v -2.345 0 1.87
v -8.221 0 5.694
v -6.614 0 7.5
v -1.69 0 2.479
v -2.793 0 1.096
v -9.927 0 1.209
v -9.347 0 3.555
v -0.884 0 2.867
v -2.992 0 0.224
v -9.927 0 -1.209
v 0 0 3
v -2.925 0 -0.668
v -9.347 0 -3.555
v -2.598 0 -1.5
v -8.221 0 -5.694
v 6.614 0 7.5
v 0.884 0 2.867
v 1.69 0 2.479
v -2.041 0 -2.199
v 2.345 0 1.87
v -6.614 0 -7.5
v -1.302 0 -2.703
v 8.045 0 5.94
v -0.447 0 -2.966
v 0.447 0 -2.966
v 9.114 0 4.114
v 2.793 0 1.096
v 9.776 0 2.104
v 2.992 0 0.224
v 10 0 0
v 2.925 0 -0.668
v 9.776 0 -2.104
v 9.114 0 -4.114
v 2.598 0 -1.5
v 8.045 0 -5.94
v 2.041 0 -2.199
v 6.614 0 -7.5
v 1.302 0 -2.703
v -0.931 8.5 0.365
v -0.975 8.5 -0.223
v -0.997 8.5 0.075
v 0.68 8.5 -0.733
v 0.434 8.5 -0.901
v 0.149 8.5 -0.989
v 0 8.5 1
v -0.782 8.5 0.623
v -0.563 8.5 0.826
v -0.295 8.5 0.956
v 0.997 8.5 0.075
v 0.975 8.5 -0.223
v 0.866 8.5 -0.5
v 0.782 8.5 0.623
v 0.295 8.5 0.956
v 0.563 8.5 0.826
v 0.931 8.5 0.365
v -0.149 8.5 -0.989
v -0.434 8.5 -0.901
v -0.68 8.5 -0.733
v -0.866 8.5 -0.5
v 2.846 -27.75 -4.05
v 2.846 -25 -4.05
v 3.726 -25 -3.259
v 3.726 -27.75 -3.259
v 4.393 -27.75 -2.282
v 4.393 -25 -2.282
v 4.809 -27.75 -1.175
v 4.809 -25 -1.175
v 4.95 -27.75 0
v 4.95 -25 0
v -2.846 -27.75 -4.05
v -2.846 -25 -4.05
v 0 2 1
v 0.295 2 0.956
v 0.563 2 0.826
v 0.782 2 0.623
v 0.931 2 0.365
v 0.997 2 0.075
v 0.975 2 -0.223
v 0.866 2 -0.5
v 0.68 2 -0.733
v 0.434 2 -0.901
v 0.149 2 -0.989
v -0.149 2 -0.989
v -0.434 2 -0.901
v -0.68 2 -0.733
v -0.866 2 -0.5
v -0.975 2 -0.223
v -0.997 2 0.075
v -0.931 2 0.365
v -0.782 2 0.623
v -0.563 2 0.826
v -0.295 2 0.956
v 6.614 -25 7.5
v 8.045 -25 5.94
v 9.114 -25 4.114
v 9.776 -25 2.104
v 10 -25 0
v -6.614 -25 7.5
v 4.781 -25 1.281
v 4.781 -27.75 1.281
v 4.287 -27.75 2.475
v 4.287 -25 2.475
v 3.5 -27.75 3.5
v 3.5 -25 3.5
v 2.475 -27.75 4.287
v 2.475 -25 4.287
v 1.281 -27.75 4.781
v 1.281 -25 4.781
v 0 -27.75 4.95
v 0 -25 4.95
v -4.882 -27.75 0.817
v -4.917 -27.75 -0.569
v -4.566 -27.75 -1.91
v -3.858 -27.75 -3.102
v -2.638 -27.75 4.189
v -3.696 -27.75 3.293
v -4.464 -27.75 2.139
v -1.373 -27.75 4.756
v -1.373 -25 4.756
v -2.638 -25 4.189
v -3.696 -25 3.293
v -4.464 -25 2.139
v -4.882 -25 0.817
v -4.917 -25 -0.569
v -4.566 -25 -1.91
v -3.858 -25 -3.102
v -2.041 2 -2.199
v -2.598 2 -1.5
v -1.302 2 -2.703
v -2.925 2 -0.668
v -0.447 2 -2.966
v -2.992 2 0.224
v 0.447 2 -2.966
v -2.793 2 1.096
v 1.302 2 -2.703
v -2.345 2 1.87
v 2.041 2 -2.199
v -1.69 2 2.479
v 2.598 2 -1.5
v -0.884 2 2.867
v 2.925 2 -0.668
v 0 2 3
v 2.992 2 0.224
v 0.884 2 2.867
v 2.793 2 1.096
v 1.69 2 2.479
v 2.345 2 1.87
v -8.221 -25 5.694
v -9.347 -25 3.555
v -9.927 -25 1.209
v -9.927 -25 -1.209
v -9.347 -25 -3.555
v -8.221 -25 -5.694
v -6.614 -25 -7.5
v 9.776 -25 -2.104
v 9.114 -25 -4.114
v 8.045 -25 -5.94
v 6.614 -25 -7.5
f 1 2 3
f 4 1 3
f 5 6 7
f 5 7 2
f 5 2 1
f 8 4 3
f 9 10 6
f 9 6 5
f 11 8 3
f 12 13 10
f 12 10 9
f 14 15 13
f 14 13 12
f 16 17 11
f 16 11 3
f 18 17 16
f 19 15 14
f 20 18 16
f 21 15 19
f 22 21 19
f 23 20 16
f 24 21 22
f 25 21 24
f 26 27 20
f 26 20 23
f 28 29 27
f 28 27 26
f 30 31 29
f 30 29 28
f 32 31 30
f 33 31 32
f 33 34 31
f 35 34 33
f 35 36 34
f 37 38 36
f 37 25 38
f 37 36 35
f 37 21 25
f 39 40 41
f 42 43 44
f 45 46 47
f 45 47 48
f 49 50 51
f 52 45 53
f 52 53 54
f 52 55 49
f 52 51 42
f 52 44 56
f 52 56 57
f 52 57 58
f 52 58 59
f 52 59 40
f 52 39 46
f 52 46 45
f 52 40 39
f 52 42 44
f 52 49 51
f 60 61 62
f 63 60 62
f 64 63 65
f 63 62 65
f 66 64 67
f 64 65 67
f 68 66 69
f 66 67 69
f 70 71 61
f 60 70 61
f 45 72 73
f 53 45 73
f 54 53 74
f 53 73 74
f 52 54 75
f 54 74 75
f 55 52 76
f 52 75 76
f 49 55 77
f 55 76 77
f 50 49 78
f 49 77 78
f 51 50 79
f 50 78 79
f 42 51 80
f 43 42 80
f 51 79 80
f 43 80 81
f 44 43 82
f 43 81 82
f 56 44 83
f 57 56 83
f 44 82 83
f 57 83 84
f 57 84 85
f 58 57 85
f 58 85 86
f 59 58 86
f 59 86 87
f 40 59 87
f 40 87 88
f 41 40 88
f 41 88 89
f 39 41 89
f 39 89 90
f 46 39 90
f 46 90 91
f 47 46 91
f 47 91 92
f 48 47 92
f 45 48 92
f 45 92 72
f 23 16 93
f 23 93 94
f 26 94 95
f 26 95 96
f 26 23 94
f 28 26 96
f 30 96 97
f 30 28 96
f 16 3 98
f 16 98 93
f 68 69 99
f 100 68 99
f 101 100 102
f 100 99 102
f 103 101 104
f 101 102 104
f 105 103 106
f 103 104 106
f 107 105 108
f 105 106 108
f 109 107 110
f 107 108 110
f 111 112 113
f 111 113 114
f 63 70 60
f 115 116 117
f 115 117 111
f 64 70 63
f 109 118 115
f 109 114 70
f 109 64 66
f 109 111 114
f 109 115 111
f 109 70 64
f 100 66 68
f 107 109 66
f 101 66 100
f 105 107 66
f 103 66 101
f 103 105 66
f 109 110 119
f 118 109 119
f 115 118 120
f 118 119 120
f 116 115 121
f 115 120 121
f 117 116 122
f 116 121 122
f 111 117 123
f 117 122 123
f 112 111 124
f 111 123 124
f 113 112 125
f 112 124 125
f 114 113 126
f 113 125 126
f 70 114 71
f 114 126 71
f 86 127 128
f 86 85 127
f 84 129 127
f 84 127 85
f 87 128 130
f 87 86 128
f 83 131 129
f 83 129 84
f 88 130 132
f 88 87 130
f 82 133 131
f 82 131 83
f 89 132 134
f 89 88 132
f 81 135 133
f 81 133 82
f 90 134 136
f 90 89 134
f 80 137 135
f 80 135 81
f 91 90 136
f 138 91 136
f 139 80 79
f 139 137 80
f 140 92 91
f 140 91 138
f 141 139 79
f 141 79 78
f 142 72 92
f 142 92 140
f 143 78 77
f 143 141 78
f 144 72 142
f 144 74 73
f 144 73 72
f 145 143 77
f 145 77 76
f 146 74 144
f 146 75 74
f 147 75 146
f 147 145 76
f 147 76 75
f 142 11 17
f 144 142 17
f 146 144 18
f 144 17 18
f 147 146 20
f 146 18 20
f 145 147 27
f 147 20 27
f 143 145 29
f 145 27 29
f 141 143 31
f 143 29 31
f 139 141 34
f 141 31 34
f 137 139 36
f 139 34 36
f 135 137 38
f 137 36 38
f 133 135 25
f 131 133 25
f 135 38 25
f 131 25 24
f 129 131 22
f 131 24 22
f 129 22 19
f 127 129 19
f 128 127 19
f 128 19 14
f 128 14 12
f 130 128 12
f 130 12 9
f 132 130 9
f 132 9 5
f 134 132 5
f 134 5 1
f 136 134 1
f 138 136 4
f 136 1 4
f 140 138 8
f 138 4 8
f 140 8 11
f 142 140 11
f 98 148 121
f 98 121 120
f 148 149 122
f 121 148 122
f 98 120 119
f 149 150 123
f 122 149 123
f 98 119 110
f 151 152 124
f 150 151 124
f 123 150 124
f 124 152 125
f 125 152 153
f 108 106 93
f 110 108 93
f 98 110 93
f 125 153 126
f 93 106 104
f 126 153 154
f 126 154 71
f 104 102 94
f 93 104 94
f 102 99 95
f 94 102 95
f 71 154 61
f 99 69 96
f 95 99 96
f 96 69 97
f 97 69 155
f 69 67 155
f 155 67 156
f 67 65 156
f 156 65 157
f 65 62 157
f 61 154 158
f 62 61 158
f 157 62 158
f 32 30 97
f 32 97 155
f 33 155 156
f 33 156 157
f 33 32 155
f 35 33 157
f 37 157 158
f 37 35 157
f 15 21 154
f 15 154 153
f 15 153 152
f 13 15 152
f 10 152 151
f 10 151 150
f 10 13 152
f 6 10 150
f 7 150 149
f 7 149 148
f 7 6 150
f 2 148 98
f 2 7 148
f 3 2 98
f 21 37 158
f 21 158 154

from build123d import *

# Parameters (mm, degrees)
BOSS_EXTRUDE1_DEPTH = 25
SKETCH1_3_R         = 3
BOSS_EXTRUDE2_DEPTH = 2
SKETCH1_4_R         = 1
BOSS_EXTRUDE3_DEPTH = 8.5
BOSS_EXTRUDE4_DEPTH = 2.75


with BuildPart() as part:
    # Sketch1 → Boss-Extrude1 (new body)
    with BuildSketch(Plane(origin=(0, 0, 0), x_dir=(1, 0, 0), z_dir=(0, 1, 0))):
        with BuildLine():
            ThreePointArc((-6.614378278, 7.5), (-10, 0), (-6.614378278, -7.5))
            Line((-6.614378278, -7.5), (6.614378278, -7.5))
            ThreePointArc((6.614378278, -7.5), (10, 0), (6.614378278, 7.5))
            Line((6.614378278, 7.5), (-6.614378278, 7.5))
        make_face()
    extrude(amount=-BOSS_EXTRUDE1_DEPTH)

    # Sketch1<3> → Boss-Extrude2 (add)
    with BuildSketch(Plane(origin=(0, 0, 0), x_dir=(1, 0, 0), z_dir=(0, 1, 0))):
        Circle(SKETCH1_3_R)
    extrude(amount=BOSS_EXTRUDE2_DEPTH)

    # Sketch1<4> → Boss-Extrude3 (add)
    with BuildSketch(Plane(origin=(0, 0, 0), x_dir=(1, 0, 0), z_dir=(0, 1, 0))):
        Circle(SKETCH1_4_R)
    extrude(amount=BOSS_EXTRUDE3_DEPTH)

    # Sketch2 → Boss-Extrude4 (add)
    with BuildSketch(Plane.XZ.offset(25)):
        with BuildLine():
            Line((-2.846049894, -4.05), (2.846049894, -4.05))
            ThreePointArc((2.846049894, -4.05), (0, 4.95), (-2.846049894, -4.05))
        make_face()
    extrude(amount=BOSS_EXTRUDE4_DEPTH)


solid = part.part
